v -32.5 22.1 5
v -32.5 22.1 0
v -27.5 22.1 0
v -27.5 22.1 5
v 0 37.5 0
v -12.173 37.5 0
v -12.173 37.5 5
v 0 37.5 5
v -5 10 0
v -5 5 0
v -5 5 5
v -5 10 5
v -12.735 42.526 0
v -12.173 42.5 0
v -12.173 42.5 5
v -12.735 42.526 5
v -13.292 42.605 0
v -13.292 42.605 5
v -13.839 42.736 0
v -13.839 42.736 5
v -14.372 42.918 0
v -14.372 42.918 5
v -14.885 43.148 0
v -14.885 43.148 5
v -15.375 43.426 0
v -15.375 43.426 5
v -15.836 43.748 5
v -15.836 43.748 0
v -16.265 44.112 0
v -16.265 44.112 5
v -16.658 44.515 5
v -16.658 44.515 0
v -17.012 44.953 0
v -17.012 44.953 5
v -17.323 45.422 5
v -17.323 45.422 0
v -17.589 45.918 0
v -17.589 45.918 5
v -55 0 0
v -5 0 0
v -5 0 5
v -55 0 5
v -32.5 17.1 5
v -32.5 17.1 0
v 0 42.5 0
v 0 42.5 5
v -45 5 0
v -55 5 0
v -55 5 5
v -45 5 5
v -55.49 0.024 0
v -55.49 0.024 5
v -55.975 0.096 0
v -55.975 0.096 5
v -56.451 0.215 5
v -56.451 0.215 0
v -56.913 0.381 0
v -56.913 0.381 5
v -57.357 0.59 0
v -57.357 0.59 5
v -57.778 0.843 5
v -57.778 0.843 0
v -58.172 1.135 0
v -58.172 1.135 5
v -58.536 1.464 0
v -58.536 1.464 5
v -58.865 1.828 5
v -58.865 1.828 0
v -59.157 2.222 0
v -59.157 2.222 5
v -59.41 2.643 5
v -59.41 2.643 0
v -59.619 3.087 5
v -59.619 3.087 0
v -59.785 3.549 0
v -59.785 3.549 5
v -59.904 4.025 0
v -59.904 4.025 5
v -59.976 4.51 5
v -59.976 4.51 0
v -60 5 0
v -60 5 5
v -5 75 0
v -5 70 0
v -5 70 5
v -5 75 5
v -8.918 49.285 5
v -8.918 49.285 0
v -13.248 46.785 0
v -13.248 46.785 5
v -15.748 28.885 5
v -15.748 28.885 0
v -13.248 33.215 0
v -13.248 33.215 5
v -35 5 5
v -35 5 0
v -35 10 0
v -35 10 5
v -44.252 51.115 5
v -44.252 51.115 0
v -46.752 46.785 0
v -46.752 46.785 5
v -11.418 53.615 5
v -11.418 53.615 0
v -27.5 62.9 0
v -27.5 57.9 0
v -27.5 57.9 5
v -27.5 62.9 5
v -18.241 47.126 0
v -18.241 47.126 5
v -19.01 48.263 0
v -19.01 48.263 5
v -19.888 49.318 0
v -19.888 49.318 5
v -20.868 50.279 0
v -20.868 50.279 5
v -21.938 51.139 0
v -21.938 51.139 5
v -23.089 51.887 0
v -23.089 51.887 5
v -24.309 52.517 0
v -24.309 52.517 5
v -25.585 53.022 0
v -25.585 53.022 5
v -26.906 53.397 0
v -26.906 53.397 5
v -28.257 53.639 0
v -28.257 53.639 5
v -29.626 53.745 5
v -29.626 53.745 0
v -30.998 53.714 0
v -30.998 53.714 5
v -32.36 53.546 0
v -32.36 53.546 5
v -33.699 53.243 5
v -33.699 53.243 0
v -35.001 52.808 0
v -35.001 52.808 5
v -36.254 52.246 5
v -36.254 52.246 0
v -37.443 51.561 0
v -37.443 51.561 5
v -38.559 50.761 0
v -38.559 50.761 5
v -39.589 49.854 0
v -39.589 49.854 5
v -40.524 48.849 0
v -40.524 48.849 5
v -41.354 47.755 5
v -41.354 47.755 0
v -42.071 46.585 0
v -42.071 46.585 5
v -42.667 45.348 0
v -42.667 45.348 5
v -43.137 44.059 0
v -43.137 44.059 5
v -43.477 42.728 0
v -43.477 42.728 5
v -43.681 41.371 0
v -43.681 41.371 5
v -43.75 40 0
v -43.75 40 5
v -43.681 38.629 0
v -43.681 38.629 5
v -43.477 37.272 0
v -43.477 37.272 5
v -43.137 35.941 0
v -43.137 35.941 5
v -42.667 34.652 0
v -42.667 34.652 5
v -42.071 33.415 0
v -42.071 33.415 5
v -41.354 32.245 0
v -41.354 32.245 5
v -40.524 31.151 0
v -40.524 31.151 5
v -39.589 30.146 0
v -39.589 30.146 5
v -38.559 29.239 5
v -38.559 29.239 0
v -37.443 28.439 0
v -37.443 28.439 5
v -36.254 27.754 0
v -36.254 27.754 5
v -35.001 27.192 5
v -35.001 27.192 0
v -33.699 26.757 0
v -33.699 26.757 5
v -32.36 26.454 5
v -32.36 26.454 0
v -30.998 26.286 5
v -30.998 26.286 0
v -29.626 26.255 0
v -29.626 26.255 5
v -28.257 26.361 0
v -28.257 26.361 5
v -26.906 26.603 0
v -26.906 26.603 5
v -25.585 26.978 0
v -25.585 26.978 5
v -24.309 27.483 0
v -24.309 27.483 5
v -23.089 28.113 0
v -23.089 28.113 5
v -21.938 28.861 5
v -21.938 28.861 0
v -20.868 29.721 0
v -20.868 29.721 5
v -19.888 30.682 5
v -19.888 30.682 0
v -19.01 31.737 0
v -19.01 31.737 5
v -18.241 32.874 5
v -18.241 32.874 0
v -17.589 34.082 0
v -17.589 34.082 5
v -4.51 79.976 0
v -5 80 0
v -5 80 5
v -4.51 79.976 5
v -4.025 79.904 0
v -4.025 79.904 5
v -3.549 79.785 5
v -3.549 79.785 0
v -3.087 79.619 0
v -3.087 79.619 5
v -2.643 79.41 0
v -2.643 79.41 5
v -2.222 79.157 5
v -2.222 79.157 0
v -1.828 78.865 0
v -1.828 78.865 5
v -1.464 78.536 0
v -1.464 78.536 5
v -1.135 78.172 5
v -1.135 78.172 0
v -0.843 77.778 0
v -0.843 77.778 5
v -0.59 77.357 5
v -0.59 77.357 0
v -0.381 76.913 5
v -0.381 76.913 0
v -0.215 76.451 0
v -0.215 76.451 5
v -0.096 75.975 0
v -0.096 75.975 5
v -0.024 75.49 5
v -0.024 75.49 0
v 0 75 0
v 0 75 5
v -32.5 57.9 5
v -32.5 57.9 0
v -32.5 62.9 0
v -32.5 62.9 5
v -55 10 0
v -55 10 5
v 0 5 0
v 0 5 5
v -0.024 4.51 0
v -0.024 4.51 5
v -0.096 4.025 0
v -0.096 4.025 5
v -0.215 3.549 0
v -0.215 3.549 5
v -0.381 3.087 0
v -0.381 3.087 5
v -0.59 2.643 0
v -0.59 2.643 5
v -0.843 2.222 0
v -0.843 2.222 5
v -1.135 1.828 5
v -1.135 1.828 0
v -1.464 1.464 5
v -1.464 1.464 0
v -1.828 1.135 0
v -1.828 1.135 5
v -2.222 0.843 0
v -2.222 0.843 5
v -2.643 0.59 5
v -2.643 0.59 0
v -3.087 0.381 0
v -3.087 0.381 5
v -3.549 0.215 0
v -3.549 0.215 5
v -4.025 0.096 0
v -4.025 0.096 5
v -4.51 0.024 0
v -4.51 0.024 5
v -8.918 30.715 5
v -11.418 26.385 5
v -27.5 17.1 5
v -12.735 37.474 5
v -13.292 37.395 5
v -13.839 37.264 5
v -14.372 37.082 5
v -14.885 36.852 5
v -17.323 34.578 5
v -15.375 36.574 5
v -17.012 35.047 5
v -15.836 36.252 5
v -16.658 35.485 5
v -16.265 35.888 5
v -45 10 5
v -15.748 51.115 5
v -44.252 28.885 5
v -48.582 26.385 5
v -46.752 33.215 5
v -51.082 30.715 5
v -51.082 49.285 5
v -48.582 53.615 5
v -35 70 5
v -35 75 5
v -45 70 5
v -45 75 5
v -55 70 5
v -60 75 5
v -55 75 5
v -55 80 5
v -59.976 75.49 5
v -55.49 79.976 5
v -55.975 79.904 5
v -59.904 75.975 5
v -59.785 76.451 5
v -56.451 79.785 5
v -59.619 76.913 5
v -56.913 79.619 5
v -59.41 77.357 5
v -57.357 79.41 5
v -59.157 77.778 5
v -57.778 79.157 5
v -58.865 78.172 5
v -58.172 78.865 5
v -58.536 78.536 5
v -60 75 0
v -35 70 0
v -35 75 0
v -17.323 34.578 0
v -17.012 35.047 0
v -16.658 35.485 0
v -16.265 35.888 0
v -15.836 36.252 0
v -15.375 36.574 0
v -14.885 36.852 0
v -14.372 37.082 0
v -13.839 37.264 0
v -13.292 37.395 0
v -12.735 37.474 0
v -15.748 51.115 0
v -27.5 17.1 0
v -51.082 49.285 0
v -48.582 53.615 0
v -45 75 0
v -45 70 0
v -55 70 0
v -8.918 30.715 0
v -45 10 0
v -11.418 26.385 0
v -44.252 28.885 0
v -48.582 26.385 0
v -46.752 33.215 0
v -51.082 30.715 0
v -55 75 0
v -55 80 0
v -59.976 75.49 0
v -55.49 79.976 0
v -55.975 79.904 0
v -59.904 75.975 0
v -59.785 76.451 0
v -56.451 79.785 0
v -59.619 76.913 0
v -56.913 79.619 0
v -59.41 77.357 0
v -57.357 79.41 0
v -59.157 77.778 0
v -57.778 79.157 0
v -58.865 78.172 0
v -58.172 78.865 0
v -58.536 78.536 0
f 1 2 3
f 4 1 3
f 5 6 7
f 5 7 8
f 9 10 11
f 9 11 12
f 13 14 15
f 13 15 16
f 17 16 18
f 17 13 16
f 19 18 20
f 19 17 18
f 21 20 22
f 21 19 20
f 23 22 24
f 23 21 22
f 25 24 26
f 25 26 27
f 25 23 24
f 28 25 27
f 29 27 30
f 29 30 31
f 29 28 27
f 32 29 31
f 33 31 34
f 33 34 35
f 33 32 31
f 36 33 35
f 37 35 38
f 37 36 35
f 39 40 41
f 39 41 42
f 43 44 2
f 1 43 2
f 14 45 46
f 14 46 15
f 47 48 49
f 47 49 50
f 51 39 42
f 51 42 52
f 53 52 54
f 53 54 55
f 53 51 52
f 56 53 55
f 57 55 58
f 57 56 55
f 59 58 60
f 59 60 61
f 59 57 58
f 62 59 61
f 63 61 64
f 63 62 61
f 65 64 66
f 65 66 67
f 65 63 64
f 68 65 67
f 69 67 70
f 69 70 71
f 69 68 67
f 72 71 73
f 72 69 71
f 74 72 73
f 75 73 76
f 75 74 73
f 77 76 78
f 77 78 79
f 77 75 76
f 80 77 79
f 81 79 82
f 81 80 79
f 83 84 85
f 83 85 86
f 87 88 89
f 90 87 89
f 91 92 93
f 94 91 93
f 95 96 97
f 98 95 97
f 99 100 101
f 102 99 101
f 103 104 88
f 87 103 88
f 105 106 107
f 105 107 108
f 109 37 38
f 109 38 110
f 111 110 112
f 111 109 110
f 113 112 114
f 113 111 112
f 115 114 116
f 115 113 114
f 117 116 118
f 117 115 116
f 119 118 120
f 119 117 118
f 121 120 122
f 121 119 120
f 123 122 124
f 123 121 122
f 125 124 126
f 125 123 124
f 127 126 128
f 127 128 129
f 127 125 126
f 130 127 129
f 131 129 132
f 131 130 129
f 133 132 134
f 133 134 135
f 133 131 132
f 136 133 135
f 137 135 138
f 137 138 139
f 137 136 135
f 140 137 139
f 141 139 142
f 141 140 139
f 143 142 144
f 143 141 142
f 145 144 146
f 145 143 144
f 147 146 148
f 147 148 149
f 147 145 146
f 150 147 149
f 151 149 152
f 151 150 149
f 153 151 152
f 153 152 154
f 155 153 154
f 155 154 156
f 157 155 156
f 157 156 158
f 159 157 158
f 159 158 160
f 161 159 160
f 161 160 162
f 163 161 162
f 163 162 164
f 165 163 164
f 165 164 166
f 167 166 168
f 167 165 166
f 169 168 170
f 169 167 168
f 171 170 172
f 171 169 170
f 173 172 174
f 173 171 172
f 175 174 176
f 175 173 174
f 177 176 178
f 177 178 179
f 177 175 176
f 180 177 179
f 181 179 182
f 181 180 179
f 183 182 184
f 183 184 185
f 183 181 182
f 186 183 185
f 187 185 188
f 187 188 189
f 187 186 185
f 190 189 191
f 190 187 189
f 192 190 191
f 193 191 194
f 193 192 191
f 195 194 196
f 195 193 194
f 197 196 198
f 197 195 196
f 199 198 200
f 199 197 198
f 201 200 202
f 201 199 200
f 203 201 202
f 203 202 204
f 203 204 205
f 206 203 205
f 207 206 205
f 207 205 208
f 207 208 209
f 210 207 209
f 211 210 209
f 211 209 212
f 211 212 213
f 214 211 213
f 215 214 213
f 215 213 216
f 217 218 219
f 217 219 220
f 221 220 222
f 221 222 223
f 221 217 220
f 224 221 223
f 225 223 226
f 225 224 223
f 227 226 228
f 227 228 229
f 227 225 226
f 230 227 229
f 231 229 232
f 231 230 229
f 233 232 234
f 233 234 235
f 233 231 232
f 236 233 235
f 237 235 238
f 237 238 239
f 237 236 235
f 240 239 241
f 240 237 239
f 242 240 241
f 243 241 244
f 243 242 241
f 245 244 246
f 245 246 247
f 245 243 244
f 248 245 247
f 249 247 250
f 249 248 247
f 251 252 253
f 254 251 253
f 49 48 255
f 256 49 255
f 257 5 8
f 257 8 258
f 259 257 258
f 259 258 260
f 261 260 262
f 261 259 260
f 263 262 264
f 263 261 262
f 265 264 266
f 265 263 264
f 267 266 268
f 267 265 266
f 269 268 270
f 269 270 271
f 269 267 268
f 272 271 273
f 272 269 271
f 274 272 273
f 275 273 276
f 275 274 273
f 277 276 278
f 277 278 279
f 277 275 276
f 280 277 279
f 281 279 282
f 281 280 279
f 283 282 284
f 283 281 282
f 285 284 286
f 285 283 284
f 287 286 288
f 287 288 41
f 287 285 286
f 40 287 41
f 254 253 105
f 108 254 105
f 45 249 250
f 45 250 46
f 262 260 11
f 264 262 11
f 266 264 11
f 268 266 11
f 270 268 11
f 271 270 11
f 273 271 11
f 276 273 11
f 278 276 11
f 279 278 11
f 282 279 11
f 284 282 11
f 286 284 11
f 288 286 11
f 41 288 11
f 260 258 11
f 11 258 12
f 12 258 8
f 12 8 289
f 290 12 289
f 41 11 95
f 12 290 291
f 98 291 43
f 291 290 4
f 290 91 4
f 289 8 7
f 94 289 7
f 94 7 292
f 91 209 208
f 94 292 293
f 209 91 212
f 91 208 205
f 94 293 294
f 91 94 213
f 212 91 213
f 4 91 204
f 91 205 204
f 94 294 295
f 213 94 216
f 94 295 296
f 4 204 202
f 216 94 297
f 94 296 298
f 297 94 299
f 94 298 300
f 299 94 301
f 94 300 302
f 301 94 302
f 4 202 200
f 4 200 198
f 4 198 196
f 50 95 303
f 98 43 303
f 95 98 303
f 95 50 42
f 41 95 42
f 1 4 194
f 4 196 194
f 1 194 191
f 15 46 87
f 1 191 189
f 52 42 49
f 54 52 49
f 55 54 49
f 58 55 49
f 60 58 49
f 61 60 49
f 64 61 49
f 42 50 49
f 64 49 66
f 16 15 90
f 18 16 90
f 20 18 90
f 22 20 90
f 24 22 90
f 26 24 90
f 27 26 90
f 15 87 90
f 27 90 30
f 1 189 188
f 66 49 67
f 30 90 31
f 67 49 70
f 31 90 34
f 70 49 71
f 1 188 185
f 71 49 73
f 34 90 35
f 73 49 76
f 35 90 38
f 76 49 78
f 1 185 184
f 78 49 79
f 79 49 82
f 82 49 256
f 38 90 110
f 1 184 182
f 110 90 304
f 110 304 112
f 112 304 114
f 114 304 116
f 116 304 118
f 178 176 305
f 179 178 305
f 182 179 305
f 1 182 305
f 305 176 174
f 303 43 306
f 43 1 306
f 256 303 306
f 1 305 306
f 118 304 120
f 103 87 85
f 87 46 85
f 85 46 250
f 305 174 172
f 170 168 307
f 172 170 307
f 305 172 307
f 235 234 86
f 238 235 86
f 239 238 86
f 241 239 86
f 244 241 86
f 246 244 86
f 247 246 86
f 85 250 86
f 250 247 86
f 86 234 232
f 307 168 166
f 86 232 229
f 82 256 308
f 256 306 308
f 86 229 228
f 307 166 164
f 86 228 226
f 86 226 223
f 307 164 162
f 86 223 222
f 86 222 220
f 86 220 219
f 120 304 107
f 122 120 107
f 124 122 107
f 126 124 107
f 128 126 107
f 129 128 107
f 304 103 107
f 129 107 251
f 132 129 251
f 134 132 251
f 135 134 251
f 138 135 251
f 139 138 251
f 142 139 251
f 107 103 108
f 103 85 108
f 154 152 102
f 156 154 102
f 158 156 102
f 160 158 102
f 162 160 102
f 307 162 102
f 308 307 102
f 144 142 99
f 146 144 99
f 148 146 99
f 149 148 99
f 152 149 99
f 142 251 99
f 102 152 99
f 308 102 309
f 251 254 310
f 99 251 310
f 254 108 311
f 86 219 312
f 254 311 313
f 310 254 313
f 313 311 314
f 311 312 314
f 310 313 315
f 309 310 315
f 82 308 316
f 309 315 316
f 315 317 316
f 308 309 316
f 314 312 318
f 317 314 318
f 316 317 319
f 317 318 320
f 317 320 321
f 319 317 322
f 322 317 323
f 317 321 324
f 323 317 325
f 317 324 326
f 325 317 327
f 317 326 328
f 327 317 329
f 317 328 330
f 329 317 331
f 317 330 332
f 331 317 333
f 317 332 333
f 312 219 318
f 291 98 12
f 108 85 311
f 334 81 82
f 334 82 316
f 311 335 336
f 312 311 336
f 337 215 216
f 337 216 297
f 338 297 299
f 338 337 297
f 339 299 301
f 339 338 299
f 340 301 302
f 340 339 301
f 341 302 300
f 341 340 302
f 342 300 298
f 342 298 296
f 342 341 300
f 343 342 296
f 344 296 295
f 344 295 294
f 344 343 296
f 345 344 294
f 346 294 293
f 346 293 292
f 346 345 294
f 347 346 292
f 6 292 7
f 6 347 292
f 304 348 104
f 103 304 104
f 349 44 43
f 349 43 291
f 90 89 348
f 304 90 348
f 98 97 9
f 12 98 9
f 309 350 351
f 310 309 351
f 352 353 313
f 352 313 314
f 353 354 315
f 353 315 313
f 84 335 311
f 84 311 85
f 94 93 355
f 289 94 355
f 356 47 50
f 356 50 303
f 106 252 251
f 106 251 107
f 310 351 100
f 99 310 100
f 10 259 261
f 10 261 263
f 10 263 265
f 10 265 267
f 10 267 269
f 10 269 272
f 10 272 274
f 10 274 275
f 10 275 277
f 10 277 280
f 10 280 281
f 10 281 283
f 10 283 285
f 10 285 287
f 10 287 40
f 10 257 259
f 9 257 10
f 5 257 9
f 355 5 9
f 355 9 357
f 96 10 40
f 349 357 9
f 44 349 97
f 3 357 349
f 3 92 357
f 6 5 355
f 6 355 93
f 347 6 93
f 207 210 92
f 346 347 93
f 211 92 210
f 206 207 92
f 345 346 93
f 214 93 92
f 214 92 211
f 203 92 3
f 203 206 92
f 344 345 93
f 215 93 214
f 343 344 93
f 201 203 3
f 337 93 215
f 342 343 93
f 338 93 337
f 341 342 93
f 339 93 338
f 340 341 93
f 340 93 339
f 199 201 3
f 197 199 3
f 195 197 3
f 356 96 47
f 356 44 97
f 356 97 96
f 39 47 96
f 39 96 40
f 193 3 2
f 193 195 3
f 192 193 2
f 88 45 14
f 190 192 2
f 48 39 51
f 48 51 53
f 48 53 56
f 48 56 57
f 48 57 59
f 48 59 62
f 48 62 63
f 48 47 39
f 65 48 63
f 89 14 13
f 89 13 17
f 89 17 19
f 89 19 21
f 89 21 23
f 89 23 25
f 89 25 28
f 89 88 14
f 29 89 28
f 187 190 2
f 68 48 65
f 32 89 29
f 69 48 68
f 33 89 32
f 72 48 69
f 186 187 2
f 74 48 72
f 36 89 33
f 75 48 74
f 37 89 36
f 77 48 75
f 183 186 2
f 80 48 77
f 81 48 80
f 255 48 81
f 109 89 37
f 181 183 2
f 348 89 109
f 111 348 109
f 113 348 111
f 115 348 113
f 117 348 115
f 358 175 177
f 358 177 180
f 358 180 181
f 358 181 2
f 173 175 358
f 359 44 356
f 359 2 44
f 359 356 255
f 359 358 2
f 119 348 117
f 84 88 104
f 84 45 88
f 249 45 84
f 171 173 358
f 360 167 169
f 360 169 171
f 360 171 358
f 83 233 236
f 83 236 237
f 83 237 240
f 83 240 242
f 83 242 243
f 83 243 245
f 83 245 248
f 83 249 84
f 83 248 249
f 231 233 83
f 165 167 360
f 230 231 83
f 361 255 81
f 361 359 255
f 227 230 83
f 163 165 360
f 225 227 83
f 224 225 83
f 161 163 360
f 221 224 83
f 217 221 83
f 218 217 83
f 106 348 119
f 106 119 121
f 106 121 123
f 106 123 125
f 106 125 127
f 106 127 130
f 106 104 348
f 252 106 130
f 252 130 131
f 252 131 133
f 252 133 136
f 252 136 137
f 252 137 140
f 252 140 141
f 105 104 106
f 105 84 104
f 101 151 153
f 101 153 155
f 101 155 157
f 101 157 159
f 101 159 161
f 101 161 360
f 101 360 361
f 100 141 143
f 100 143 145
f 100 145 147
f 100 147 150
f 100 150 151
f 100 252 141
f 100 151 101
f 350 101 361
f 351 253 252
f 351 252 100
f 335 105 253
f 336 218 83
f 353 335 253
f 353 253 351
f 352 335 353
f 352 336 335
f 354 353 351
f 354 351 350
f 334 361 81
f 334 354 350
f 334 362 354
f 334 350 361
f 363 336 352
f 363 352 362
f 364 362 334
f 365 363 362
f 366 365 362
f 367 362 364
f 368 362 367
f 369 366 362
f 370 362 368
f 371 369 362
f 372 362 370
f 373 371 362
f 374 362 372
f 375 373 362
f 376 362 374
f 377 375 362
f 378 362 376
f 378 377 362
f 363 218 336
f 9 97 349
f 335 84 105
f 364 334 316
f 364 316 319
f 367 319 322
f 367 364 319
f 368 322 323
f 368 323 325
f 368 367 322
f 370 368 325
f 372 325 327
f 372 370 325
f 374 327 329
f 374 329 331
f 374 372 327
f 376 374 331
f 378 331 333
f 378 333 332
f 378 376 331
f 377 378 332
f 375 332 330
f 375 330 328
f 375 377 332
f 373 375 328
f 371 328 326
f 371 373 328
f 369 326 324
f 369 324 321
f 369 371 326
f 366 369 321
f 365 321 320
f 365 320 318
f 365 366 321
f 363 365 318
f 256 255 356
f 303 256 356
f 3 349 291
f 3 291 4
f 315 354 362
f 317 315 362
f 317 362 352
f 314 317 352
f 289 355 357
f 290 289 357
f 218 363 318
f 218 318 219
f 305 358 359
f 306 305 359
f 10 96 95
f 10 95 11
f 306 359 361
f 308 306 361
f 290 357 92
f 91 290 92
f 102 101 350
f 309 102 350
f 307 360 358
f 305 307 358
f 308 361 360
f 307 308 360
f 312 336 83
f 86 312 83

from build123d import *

# Parameters (mm, degrees)
ESQUISSE1_W        = 10
ESQUISSE1_H        = 5
ESQUISSE1_W_2      = 30
ESQUISSE1_W_3      = 5
BOSS_EXTRU_1_DEPTH = 5


with BuildPart() as part:
    # Esquisse1 → Boss.-Extru.1 (new body)
    with BuildSketch(Plane.XY):
        with BuildLine():
            Line((-55, 80), (-5, 80))
            ThreePointArc((-5, 80), (-1.464466094, 78.535533906), (0, 75))
            Line((0, 75), (0, 42.5))
            Line((0, 42.5), (-12.172703514, 42.5))
            ThreePointArc((-12.172703514, 42.5), (-15.374759815, 43.42586604), (-17.588591054, 45.917721519))
            ThreePointArc((-17.588591054, 45.917721519), (-43.75, 40), (-17.588591054, 34.082278481))
            ThreePointArc((-17.588591054, 34.082278481), (-15.374759815, 36.57413396), (-12.172703514, 37.5))
            Line((-12.172703514, 37.5), (0, 37.5))
            Line((0, 37.5), (0, 5))
            ThreePointArc((0, 5), (-1.464466094, 1.464466094), (-5, 0))
            Line((-5, 0), (-55, 0))
            ThreePointArc((-55, 0), (-58.535533906, 1.464466094), (-60, 5))
            Line((-60, 5), (-60, 75))
            ThreePointArc((-60, 75), (-58.535533906, 78.535533906), (-55, 80))
        make_face()
        with Locations((-50, 7.5)):
            Rectangle(ESQUISSE1_W, ESQUISSE1_H, mode=Mode.SUBTRACT)
        with Locations((-20, 7.5)):
            Rectangle(ESQUISSE1_W_2, ESQUISSE1_H, mode=Mode.SUBTRACT)
        with Locations((-20, 72.5)):
            Rectangle(ESQUISSE1_W_2, ESQUISSE1_H, mode=Mode.SUBTRACT)
        with Locations((-50, 72.5)):
            Rectangle(ESQUISSE1_W, ESQUISSE1_H, mode=Mode.SUBTRACT)
        with Locations((-30, 60.4)):
            Rectangle(ESQUISSE1_W_3, ESQUISSE1_H, mode=Mode.SUBTRACT)
        Polygon((-11.418018253, 53.615063509), (-8.918018253, 49.284936491), (-13.248145272, 46.784936491), (-15.748145272, 51.115063509), align=None, mode=Mode.SUBTRACT)
        Polygon((-8.918018253, 30.715063509), (-11.418018253, 26.384936491), (-15.748145272, 28.884936491), (-13.248145272, 33.215063509), align=None, mode=Mode.SUBTRACT)
        with Locations((-30, 19.6)):
            Rectangle(ESQUISSE1_W_3, ESQUISSE1_H, mode=Mode.SUBTRACT)
        Polygon((-48.581981747, 26.384936491), (-51.081981747, 30.715063509), (-46.751854728, 33.215063509), (-44.251854728, 28.884936491), align=None, mode=Mode.SUBTRACT)
        Polygon((-51.081981747, 49.284936491), (-48.581981747, 53.615063509), (-44.251854728, 51.115063509), (-46.751854728, 46.784936491), align=None, mode=Mode.SUBTRACT)
    extrude(amount=BOSS_EXTRU_1_DEPTH)


solid = part.part
